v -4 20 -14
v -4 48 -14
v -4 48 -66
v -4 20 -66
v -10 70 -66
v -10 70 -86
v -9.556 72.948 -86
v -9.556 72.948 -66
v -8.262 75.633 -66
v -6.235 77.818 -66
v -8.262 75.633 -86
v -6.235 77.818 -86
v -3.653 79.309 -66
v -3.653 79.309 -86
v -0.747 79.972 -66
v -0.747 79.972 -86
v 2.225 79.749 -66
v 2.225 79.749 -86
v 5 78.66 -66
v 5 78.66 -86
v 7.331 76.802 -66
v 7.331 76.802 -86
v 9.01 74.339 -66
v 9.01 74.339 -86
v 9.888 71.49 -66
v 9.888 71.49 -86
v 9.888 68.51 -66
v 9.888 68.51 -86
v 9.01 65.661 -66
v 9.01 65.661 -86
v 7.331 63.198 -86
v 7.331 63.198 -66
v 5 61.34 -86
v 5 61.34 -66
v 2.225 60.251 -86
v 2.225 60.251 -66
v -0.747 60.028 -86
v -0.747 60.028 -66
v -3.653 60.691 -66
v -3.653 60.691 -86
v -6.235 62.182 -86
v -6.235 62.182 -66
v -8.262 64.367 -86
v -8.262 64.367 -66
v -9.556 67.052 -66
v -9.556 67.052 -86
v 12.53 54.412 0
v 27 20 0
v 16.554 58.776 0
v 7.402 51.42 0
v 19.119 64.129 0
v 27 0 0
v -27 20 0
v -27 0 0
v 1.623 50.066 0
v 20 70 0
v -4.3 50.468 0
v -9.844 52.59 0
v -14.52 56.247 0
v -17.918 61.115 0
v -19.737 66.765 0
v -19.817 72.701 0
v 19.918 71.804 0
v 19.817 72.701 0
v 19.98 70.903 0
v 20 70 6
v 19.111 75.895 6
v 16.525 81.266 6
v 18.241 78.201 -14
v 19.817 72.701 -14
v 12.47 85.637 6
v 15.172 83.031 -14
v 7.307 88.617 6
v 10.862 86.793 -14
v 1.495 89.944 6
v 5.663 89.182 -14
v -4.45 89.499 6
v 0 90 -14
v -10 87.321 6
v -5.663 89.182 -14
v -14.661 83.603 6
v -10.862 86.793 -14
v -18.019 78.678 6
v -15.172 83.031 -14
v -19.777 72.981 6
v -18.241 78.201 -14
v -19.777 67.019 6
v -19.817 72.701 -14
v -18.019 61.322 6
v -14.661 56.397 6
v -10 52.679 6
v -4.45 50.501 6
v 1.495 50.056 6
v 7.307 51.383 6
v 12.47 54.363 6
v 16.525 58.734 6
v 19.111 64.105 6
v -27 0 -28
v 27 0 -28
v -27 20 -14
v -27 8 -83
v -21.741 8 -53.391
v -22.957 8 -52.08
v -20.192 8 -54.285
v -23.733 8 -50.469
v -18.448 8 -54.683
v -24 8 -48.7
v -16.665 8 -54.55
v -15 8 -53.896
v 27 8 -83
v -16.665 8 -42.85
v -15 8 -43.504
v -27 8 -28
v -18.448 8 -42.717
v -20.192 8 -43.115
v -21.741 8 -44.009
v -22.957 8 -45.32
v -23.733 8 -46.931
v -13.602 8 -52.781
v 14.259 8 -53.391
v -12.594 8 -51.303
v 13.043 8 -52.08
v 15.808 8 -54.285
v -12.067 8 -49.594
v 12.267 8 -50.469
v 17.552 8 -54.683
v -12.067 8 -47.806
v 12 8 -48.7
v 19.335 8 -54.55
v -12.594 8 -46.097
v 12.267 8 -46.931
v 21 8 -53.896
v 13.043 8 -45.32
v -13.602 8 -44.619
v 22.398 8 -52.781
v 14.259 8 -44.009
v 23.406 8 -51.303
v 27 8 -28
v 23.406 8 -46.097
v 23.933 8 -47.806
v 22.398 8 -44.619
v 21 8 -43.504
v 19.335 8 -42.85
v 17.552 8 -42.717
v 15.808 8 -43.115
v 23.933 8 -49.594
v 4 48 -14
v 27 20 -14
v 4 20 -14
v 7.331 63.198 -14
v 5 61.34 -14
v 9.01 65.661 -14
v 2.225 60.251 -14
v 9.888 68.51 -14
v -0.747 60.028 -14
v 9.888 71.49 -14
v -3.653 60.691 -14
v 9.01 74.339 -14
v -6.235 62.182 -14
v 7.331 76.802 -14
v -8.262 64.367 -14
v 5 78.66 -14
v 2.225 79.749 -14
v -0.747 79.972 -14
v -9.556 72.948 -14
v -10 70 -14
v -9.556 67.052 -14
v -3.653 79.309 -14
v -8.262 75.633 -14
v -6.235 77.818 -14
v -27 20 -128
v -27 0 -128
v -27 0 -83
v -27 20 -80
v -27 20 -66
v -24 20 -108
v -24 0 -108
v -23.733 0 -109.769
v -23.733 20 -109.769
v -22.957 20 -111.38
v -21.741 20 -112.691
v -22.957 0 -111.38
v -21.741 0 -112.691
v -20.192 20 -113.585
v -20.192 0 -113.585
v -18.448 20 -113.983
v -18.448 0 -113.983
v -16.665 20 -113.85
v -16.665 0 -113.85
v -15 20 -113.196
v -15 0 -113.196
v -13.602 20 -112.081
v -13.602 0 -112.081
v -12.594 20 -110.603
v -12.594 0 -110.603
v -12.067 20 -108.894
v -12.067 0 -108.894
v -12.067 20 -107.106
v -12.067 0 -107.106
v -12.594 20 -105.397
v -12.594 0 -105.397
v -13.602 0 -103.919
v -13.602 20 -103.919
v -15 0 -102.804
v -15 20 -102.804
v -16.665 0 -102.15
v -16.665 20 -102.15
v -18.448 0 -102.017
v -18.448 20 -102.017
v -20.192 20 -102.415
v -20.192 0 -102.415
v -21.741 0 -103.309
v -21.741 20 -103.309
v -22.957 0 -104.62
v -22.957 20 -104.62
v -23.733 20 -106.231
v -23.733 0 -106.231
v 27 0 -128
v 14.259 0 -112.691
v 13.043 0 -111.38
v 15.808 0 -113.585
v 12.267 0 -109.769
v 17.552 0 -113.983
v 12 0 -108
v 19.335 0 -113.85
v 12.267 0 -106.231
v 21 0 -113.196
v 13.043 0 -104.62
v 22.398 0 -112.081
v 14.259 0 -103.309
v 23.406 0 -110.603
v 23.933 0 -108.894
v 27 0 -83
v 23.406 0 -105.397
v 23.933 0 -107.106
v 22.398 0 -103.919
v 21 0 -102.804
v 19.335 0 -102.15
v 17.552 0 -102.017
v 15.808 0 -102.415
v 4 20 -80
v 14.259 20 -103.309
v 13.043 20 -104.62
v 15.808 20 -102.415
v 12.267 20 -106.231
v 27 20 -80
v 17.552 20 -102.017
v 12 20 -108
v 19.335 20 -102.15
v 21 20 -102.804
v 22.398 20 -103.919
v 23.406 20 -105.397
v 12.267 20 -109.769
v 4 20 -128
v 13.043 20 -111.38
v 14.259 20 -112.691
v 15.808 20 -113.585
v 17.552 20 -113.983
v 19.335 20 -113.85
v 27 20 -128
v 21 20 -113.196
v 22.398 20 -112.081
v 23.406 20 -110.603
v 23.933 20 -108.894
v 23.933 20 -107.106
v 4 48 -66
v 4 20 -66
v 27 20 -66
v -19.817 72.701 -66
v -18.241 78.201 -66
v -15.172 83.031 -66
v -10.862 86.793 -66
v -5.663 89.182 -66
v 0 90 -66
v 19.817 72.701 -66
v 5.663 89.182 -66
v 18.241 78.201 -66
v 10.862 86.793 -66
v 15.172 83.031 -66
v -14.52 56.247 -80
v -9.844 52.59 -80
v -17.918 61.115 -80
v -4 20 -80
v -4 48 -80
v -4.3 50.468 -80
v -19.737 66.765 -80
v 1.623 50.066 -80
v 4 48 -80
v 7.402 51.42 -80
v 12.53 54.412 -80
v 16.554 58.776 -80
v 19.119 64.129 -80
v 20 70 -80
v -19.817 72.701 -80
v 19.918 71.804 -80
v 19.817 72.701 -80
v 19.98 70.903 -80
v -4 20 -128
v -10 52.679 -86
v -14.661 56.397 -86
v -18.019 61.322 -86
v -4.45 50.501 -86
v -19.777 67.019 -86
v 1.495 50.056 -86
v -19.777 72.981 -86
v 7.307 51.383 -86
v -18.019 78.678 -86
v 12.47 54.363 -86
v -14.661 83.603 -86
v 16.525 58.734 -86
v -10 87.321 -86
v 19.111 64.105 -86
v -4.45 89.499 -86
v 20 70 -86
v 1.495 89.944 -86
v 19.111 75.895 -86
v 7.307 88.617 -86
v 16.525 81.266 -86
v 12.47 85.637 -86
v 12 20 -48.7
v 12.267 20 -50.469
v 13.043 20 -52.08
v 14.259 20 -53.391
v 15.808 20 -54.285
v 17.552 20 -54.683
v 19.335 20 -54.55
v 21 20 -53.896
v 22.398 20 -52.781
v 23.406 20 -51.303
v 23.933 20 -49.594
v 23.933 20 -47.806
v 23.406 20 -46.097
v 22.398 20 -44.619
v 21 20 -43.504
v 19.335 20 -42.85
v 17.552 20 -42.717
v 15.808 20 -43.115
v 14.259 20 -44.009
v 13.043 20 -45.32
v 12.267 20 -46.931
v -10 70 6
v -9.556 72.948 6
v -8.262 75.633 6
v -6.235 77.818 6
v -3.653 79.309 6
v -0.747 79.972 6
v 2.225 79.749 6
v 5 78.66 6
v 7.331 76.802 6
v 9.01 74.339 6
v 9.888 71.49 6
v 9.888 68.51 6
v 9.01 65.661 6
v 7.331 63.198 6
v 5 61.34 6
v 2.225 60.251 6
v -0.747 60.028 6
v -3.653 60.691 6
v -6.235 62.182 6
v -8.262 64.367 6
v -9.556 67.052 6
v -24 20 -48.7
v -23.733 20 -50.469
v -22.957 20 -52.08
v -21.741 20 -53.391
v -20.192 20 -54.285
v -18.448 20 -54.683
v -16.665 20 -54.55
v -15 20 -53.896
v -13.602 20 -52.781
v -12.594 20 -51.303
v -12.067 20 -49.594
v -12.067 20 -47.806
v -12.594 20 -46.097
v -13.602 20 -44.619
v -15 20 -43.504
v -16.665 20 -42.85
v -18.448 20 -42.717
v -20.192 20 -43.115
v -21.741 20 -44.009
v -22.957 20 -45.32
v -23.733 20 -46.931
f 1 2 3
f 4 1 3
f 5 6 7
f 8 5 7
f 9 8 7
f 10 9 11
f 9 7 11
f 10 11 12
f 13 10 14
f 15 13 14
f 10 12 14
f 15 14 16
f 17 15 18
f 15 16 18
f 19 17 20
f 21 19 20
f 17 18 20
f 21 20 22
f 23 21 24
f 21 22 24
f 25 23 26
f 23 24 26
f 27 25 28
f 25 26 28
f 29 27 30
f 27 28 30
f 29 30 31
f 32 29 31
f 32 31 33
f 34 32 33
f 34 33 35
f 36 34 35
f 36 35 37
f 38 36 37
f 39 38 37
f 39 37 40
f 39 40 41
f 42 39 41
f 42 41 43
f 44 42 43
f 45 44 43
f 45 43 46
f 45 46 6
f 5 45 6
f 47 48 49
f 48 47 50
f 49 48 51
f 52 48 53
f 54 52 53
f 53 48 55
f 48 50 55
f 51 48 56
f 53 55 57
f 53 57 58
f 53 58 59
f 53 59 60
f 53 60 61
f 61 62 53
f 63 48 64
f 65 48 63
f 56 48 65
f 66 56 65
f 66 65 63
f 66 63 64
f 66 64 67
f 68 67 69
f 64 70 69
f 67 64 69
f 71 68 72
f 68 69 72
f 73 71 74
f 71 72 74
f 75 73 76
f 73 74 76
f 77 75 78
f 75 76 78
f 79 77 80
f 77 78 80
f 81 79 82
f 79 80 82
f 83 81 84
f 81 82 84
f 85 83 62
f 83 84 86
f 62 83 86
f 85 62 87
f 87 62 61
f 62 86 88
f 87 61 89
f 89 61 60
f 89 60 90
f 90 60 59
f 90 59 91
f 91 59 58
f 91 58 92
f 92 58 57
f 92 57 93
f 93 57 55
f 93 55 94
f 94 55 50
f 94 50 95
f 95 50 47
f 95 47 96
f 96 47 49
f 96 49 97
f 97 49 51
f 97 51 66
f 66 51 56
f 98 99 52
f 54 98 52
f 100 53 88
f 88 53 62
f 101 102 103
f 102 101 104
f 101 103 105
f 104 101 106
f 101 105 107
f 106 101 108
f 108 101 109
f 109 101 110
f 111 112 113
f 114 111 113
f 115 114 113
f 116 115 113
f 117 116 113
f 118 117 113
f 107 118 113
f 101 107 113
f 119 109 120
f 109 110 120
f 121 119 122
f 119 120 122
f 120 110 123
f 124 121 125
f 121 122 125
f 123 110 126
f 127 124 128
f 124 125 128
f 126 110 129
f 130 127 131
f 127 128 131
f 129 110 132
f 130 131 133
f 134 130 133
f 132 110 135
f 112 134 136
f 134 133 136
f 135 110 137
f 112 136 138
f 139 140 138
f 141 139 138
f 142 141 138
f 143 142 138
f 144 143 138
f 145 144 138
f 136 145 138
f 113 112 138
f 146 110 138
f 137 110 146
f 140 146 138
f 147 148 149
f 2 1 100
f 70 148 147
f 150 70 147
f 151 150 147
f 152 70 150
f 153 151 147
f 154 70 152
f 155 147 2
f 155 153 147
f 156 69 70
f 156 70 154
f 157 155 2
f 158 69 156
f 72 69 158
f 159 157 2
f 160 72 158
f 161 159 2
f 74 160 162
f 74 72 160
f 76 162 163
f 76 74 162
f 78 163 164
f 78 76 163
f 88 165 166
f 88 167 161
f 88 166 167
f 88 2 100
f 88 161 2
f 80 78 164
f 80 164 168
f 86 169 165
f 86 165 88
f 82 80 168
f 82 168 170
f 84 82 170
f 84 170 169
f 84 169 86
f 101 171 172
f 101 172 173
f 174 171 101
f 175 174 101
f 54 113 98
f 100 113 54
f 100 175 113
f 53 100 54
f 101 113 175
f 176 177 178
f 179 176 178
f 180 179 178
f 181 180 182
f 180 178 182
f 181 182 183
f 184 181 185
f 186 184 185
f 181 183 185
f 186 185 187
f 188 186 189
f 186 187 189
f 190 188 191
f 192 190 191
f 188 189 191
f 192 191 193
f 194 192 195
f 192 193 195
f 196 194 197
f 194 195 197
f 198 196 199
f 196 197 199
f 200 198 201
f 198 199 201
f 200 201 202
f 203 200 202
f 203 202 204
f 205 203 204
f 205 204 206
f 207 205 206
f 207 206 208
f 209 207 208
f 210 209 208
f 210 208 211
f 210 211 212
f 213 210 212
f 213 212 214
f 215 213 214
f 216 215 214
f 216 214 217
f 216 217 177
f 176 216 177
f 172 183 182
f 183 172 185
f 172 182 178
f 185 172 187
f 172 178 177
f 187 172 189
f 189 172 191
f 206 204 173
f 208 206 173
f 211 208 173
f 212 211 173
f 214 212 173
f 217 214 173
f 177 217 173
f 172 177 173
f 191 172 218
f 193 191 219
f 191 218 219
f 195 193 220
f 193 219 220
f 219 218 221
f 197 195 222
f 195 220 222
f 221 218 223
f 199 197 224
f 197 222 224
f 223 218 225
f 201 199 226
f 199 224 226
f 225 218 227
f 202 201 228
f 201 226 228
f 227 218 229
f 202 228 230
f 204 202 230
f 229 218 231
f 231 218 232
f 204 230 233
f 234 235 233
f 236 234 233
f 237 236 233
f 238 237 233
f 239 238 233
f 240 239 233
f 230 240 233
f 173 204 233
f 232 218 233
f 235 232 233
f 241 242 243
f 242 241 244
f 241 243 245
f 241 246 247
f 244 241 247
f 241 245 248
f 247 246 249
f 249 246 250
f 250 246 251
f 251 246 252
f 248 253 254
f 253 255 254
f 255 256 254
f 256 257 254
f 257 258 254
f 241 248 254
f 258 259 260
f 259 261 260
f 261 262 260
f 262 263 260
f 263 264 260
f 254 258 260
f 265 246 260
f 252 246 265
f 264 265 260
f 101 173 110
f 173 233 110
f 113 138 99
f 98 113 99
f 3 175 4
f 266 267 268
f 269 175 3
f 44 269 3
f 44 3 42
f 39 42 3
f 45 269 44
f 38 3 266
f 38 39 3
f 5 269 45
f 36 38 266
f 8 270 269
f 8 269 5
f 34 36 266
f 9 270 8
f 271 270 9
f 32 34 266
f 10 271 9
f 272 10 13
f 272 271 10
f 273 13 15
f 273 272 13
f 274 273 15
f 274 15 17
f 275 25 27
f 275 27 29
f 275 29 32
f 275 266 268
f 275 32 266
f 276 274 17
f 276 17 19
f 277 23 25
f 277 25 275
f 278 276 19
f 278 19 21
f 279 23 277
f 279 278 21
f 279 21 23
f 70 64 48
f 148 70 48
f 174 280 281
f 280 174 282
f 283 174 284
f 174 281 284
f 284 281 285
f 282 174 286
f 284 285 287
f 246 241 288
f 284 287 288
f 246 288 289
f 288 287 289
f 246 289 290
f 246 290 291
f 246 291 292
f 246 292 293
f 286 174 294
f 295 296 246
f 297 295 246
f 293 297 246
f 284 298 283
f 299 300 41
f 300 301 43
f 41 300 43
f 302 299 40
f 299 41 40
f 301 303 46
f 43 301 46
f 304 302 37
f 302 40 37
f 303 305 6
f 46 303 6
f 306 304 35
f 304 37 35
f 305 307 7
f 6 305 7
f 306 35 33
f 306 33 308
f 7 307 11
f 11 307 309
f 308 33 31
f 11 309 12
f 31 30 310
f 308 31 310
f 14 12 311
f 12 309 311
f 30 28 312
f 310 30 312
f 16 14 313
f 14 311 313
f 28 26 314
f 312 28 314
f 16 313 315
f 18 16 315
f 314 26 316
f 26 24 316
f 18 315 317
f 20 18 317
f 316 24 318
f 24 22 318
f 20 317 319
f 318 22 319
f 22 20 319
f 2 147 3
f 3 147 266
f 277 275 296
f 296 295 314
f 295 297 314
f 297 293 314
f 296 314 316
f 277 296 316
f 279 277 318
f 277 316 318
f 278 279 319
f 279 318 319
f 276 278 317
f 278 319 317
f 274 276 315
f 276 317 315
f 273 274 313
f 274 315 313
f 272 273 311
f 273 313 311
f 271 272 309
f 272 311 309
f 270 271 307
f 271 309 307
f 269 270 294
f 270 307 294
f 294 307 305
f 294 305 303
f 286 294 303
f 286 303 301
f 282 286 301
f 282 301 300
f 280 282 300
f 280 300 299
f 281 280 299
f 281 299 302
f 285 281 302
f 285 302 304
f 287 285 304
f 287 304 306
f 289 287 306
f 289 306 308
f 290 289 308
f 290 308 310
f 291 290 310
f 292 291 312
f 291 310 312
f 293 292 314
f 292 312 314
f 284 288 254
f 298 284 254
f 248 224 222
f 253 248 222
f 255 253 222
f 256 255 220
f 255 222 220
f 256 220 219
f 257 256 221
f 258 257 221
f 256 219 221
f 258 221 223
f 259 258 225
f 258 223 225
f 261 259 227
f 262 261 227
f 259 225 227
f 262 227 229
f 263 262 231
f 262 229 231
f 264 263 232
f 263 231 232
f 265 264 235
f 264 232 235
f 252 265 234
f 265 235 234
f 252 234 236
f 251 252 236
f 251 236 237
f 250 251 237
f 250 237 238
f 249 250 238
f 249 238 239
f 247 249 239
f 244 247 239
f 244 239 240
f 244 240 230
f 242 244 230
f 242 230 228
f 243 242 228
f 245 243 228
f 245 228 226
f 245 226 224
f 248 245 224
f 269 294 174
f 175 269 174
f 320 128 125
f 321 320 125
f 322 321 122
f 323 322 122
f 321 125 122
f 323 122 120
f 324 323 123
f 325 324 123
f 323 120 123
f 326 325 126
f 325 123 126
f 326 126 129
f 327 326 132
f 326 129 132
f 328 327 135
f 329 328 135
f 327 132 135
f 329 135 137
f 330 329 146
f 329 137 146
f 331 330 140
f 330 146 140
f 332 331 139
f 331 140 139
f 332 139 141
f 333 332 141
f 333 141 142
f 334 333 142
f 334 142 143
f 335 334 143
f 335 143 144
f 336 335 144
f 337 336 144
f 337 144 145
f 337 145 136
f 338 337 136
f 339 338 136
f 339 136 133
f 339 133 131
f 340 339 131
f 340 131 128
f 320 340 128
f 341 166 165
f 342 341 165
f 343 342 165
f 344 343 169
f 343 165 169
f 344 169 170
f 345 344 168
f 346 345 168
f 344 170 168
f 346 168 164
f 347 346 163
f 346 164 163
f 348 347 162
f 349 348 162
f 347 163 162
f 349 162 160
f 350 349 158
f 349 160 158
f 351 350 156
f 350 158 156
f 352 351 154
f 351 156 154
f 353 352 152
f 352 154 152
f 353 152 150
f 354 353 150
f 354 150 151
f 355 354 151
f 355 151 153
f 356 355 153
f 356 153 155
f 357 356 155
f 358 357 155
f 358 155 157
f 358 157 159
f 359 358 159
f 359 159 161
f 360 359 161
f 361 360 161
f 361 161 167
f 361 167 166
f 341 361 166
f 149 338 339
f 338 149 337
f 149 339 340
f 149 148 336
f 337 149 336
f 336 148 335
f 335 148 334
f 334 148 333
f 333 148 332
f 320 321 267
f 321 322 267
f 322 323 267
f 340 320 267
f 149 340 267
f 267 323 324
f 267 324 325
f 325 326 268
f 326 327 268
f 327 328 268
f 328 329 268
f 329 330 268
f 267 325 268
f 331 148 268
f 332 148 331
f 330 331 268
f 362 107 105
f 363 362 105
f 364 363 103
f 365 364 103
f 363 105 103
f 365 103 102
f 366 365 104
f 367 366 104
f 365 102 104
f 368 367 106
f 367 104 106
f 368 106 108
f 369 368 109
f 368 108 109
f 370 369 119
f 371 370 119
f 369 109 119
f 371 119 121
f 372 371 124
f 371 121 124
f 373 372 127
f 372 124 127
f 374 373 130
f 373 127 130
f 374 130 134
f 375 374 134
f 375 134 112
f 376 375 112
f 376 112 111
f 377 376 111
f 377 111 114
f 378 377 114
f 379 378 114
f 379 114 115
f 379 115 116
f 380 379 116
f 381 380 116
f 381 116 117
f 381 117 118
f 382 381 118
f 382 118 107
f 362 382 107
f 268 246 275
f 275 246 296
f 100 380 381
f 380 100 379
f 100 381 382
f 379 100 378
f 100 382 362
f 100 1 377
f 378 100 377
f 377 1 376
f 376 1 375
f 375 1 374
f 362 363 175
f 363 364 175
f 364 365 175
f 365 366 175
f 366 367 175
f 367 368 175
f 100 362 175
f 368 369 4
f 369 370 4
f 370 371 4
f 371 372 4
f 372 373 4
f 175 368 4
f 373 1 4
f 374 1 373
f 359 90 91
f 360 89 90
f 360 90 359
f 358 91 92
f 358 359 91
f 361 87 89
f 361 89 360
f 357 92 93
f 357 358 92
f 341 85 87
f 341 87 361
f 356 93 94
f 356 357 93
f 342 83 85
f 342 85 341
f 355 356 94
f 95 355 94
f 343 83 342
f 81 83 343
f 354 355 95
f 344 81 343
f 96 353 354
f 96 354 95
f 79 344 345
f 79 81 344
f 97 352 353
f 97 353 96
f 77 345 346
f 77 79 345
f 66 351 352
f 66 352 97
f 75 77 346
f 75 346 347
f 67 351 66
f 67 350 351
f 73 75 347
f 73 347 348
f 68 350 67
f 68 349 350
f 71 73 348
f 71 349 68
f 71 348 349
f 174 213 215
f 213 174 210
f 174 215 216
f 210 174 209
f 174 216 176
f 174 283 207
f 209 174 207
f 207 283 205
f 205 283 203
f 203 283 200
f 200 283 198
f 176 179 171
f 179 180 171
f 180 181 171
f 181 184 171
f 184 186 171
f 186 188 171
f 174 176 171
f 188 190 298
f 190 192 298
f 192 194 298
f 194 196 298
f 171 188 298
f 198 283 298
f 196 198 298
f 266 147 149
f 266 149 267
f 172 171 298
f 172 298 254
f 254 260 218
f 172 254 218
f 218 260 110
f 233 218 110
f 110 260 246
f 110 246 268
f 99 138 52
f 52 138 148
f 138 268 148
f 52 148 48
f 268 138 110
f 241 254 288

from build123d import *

# Parameters (mm, degrees)
BOSS_EXTRUDE1_DEPTH      = 27
BOSS_EXTRUDE2_DEPTH      = 6
BOSS_EXTRUDE2_DEPTH_BACK = 14
SKETCH2_R                = 20
BOSS_EXTRUDE3_START      = -6
BOSS_EXTRUDE3_DEPTH      = 14
BOSS_EXTRUDE4_START      = -14
BOSS_EXTRUDE4_DEPTH      = 14
BOSS_EXTRUDE5_START      = -20
SKETCH5_R                = 20
BOSS_EXTRUDE5_DEPTH      = 20
HOLE1_D                  = 20
SKETCH8_W                = 52
SKETCH8_H                = 28
BOSS_EXTRUDE6_DEPTH      = 4
BOSS_EXTRUDE7_DEPTH      = 4
HOLE2_D                  = 12
LPATTERN1_COUNT          = 2
LPATTERN1_PITCH          = 59.3


with BuildPart() as part:
    # Sketch1 → Boss-Extrude1 (new, symmetric)
    with BuildSketch(Plane(origin=(0, 0, 0), x_dir=(0, 0, -1), z_dir=(1, 0, 0))):
        Polygon((0, 0), (0, 20), (128, 20), (128, 0), (83, 0), (83, 8), (28, 8), (28, 0), align=None)
    extrude(amount=BOSS_EXTRUDE1_DEPTH, both=True)



with BuildPart() as body_2:
    # Sketch2 → Boss-Extrude2 (new, two sides: drawn at the far end of the back side and taken through both)
    with BuildSketch(Plane.XY.offset(-BOSS_EXTRUDE2_DEPTH_BACK)):
        with Locations((0, 70)):
            Circle(SKETCH2_R)
    extrude(amount=BOSS_EXTRUDE2_DEPTH + BOSS_EXTRUDE2_DEPTH_BACK)


with BuildPart() as part_1:
    add(part.part)

    add(body_2.part)  # Boss-Extrude3 merges body 2
    # Sketch3 → Boss-Extrude3 (add)
    with BuildSketch(Plane.XY.offset(6).offset(BOSS_EXTRUDE3_START)):
        with BuildLine():
            Line((27, 20), (-27, 20))
            Line((-27, 20), (-19.816768222, 72.70105484))
            ThreePointArc((-19.816768222, 72.70105484), (0, 50), (19.816768222, 72.70105484))
            Line((19.816768222, 72.70105484), (27, 20))
        make_face()
    extrude(amount=-BOSS_EXTRUDE3_DEPTH)

    # Sketch4 → Boss-Extrude4 (add)
    with BuildSketch(Plane.XY.offset(-66).offset(BOSS_EXTRUDE4_START)):
        with BuildLine():
            Line((-27, 20), (27, 20))
            Line((27, 20), (19.816768222, 72.70105484))
            ThreePointArc((19.816768222, 72.70105484), (0, 90), (-19.816768222, 72.70105484))
            Line((-19.816768222, 72.70105484), (-27, 20))
        make_face()
    extrude(amount=BOSS_EXTRUDE4_DEPTH)

    # Sketch5 → Boss-Extrude5 (add)
    with BuildSketch(Plane.XY.offset(-66).offset(BOSS_EXTRUDE5_START)):
        with Locations((0, 70)):
            Circle(SKETCH5_R)
    extrude(amount=BOSS_EXTRUDE5_DEPTH)

    # Hole1 (through all)
    with Locations(Plane.XY.offset(6)):
        with Locations((0, 70)):
            Hole(HOLE1_D / 2)

    # Sketch8 → Boss-Extrude6 (add, symmetric)
    with BuildSketch(Plane(origin=(0, 0, 0), x_dir=(0, 0, -1), z_dir=(1, 0, 0))):
        with Locations((40, 34)):
            Rectangle(SKETCH8_W, SKETCH8_H)
    extrude(amount=BOSS_EXTRUDE6_DEPTH, both=True)

    # Sketch9 → Boss-Extrude7 (add, symmetric)
    with BuildSketch(Plane(origin=(0, 0, 0), x_dir=(0, 0, -1), z_dir=(1, 0, 0))):
        Polygon((80, 48), (128, 20), (80, 20), align=None)
    extrude(amount=BOSS_EXTRUDE7_DEPTH, both=True)

    # Hole2 (through all)
    with Locations(Plane(origin=(0, 20, 0), x_dir=(1, 0, 0), z_dir=(0, 1, 0))):
        with Locations((18, 108), (-18, 108)):
            hole2 = Hole(HOLE2_D / 2)

    # LPattern1: Hole2 ×2
    with Locations(*[(0, 0, i * LPATTERN1_PITCH) for i in range(1, LPATTERN1_COUNT)]):
        add(hole2, mode=Mode.SUBTRACT)


solid = part_1.part
